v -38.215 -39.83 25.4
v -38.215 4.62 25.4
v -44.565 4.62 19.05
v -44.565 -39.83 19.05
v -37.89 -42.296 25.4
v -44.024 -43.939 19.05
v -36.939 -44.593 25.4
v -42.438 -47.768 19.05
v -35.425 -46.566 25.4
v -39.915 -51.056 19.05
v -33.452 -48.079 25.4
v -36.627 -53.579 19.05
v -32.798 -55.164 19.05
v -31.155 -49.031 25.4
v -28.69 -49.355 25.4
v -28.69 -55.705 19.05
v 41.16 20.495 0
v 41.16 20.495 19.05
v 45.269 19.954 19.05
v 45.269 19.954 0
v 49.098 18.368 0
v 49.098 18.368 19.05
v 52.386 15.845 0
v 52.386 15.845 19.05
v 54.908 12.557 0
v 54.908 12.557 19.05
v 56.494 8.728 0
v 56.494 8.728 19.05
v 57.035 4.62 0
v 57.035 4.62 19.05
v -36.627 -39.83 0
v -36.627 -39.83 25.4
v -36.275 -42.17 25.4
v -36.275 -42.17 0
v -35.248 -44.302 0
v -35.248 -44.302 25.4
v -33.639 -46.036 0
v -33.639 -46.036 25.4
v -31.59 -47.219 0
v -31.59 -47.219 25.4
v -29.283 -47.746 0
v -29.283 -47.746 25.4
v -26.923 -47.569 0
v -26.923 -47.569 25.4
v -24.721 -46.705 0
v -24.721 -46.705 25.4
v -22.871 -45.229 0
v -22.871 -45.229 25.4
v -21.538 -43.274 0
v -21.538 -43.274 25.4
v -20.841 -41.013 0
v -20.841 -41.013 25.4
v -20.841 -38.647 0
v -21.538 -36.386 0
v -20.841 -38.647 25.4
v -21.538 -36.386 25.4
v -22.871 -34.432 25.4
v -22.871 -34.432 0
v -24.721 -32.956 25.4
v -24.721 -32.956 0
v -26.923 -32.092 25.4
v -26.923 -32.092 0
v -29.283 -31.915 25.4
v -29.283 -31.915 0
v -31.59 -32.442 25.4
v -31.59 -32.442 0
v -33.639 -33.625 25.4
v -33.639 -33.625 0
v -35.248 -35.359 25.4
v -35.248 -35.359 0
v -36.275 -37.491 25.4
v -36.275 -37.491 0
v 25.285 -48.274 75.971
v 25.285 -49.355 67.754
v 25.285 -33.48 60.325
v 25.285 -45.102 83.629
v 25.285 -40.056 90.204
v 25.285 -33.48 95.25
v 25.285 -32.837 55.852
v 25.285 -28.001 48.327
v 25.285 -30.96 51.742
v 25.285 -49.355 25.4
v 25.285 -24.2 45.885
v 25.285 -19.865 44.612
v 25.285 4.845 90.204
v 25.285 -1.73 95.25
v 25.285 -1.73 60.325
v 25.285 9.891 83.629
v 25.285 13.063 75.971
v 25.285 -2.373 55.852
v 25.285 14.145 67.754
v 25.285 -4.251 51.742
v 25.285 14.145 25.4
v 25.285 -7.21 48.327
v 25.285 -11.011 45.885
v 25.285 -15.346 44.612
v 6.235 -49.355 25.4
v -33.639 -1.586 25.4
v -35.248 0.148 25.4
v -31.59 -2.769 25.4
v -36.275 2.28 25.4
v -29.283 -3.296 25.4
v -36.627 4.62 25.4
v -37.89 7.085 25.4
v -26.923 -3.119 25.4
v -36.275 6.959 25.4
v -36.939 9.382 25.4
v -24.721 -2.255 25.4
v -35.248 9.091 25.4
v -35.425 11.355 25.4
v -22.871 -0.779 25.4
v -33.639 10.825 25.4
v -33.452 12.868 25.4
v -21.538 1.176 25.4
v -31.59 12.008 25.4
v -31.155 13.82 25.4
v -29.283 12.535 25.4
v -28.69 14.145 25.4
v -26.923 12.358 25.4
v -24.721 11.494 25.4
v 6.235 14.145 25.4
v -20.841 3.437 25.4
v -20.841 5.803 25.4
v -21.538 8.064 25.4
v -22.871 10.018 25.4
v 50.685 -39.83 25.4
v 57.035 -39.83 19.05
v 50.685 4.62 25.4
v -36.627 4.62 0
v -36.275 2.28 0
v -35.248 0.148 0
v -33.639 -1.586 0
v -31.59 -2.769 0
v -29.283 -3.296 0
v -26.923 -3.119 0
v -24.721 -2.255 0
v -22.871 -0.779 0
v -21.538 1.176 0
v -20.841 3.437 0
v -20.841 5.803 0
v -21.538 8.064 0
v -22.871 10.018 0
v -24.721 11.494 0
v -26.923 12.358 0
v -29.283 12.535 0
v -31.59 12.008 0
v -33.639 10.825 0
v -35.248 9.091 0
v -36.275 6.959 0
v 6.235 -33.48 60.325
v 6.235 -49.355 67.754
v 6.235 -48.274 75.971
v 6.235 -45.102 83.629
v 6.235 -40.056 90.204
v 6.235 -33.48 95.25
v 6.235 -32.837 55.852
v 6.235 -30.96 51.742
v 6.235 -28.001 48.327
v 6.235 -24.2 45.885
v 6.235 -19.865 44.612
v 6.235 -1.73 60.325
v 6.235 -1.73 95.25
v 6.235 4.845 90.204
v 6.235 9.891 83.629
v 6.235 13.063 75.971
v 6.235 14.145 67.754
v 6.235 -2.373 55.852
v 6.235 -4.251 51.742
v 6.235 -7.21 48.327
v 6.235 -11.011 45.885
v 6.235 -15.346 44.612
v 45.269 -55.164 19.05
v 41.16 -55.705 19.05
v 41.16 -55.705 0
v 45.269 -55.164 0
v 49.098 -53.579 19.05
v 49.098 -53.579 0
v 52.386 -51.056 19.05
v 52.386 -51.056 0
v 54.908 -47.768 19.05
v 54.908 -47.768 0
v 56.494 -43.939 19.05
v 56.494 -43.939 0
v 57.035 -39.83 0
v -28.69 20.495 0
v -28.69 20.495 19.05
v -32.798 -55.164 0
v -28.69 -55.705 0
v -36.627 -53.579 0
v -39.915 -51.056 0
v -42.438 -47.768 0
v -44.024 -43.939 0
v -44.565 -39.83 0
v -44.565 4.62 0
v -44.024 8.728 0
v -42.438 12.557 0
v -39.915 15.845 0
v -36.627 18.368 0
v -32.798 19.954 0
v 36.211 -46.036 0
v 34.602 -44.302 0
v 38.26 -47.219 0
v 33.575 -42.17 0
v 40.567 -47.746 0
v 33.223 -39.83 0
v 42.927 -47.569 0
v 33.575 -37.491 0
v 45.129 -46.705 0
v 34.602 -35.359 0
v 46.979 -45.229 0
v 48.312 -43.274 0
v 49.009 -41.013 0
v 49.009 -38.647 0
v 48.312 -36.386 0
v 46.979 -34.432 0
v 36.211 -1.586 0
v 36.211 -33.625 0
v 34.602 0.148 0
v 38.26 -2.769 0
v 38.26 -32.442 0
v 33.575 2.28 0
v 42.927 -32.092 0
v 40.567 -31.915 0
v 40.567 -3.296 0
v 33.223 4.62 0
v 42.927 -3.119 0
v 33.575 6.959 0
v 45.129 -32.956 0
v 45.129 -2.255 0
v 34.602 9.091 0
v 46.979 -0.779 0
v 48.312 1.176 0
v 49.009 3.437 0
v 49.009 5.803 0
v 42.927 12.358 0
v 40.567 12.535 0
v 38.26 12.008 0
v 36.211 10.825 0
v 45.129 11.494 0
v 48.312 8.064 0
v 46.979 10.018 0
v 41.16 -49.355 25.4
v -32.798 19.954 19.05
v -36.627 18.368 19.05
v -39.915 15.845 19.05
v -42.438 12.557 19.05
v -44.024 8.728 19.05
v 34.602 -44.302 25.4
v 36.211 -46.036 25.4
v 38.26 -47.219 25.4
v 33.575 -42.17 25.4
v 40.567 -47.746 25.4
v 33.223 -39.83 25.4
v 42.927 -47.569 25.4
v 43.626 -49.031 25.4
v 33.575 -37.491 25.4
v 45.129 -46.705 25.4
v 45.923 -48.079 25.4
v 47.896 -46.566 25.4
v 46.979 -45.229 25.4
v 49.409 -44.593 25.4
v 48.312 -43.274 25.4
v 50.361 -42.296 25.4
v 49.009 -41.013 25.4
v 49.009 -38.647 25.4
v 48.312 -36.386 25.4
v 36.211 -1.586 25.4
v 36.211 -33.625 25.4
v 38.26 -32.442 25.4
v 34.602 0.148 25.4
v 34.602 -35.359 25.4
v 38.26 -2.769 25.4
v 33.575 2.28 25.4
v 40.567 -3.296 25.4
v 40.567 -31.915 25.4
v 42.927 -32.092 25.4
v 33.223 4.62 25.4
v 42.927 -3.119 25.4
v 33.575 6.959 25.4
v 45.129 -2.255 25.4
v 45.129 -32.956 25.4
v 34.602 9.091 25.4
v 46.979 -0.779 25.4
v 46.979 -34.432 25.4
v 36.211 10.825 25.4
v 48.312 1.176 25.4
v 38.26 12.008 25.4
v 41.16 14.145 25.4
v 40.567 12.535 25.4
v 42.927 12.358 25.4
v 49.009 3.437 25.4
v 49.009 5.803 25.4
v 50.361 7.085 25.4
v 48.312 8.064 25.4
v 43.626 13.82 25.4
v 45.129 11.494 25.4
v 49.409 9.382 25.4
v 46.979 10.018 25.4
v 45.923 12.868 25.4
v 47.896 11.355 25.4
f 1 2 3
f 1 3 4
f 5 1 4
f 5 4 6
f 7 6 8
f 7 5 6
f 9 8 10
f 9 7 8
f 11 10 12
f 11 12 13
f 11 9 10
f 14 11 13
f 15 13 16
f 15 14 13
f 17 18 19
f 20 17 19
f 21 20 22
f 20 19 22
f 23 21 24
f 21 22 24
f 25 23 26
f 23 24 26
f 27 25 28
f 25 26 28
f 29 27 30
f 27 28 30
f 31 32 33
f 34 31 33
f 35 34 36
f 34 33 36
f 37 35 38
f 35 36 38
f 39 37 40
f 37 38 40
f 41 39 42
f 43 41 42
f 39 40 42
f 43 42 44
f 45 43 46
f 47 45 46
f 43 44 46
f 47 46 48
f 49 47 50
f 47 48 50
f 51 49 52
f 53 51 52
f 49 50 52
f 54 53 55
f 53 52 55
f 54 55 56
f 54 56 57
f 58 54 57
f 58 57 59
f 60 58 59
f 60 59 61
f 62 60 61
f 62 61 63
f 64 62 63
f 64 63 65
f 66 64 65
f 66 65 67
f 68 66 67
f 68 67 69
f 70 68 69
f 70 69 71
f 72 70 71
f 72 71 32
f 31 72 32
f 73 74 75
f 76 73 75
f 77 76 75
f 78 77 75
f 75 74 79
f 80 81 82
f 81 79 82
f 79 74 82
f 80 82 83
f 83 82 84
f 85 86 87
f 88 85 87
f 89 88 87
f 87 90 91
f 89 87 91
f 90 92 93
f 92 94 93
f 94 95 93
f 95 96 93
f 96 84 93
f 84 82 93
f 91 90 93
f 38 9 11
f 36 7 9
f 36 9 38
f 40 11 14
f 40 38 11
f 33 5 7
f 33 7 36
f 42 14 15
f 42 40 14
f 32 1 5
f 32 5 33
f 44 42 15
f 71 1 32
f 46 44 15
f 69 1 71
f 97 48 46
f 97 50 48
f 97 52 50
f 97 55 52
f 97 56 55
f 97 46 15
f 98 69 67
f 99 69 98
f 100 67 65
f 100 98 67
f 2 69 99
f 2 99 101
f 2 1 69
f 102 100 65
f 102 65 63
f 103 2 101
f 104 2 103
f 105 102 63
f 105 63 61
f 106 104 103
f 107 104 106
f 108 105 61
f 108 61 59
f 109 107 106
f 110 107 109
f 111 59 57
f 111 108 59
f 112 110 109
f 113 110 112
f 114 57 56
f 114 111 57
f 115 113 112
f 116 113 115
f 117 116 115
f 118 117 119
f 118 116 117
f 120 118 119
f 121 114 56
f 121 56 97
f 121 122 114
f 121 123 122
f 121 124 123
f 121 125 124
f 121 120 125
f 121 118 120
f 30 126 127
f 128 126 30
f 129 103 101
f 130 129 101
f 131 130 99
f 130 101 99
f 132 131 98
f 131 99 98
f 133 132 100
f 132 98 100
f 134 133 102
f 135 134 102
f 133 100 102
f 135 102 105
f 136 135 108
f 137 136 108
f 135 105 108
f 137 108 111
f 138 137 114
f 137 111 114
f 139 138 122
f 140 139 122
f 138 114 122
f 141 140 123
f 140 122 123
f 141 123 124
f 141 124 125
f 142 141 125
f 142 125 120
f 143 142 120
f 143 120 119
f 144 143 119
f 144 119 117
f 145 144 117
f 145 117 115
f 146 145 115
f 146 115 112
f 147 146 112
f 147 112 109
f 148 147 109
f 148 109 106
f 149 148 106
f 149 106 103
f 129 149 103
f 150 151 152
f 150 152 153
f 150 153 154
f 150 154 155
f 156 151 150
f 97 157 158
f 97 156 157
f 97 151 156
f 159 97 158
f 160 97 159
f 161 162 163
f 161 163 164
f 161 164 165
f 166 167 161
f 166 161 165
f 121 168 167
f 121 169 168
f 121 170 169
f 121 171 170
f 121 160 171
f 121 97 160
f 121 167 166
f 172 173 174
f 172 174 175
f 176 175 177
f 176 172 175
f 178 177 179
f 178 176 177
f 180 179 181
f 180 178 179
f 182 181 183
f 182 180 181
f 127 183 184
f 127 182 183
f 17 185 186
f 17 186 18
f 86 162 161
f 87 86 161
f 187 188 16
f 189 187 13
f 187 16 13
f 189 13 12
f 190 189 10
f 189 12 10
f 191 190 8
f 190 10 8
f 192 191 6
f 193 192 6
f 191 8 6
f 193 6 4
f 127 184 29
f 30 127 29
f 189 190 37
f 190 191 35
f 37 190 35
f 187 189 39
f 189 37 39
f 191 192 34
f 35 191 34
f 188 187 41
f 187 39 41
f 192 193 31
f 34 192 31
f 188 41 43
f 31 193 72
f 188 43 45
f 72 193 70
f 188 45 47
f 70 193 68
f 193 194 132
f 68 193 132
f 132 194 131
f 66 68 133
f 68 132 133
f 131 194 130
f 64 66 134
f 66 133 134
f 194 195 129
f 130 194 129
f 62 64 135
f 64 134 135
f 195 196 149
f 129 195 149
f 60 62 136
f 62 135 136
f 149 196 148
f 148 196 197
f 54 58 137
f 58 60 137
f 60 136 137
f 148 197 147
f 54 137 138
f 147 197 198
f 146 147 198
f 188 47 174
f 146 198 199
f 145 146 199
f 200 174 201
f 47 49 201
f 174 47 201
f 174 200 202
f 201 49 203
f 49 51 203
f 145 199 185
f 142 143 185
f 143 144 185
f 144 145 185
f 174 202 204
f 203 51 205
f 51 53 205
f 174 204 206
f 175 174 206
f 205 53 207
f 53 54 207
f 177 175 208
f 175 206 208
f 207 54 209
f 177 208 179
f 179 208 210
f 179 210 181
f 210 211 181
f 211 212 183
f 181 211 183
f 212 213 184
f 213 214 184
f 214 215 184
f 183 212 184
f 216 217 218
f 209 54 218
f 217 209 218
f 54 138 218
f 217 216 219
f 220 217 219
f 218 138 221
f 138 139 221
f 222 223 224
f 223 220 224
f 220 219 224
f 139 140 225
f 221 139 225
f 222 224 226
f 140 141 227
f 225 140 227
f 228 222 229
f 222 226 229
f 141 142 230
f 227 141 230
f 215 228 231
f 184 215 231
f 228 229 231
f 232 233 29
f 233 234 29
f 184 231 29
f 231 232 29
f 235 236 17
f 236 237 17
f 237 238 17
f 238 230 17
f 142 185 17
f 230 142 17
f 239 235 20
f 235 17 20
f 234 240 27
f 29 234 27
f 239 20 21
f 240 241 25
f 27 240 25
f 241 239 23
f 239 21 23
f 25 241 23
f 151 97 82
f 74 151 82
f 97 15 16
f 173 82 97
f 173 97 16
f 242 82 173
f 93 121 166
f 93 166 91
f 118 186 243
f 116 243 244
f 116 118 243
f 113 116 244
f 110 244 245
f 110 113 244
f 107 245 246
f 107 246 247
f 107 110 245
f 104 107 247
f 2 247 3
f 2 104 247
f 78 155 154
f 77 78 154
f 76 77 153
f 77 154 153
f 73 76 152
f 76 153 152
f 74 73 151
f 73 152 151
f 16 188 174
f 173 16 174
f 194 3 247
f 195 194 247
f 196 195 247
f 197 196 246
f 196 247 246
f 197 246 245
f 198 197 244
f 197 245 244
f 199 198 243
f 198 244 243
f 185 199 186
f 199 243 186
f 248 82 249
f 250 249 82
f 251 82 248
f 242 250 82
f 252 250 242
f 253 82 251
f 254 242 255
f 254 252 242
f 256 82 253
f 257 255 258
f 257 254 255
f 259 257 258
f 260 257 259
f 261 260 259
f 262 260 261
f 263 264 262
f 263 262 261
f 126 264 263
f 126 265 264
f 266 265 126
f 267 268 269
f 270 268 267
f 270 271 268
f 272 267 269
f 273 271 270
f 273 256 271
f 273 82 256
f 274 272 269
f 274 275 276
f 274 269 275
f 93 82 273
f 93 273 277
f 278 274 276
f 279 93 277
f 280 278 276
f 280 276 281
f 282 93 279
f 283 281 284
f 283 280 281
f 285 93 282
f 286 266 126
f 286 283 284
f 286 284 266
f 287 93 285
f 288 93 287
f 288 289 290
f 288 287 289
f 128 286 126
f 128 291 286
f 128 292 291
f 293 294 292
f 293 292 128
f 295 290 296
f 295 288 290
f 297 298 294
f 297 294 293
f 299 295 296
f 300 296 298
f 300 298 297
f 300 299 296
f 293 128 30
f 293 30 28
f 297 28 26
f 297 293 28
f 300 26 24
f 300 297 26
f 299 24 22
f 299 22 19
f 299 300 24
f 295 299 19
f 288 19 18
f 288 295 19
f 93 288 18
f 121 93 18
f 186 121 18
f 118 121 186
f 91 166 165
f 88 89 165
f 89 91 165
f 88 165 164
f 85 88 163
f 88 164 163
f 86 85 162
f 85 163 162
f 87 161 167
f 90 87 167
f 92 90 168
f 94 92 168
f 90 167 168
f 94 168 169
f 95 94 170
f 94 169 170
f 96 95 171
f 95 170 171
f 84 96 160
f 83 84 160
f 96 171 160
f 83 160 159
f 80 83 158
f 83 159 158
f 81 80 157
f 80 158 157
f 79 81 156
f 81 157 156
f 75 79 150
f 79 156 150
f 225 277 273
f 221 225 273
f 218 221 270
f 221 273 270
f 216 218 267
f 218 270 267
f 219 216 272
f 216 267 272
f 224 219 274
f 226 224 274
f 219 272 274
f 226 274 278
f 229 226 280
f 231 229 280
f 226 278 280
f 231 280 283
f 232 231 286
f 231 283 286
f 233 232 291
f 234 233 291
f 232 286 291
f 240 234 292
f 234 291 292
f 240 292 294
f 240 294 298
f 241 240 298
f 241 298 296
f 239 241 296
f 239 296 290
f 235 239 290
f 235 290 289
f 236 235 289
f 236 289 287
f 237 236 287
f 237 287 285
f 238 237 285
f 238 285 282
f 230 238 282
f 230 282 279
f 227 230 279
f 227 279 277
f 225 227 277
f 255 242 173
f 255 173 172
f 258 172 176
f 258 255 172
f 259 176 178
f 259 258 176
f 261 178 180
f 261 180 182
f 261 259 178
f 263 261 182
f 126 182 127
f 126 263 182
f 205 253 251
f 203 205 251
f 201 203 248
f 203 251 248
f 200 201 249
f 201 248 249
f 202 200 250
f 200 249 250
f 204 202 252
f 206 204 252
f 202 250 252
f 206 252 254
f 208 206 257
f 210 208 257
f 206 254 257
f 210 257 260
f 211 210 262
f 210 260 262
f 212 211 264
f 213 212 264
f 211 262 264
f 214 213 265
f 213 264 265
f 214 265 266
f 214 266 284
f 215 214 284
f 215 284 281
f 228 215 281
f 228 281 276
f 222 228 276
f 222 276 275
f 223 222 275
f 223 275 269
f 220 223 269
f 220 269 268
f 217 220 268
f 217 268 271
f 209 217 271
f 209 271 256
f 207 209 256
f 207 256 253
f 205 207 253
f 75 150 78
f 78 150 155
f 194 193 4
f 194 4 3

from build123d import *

# Parameters (mm, degrees)
F0_W         = 101.6
F0_H         = 76.2
F1_DEPTH     = 25.4
F2_R         = 15.875
F3_R         = 15.875
F4_R         = 15.875
F5_R         = 15.875
F7_D         = 15.875
F8_SIZE      = 6.35
F9_W         = 19.05
F9_H         = 63.5
F10_DEPTH    = 69.85
F12_DEPTH    = 25.4
F13_T1_DEPTH = 156.5315328508
F14_T1_DEPTH = 156.5315328508


# Not quite as in the source:
# - a fillet or chamfer that OpenCascade refuses, or shapes differently, is made with other operations: its cross-section is extruded or revolved along the edge and cut away or added


with BuildPart() as f1:
    # F0 (on Top) → F1 (new body)
    with BuildSketch(Plane.XY):
        with Locations((6.2353381336, -17.6054243982)):
            Rectangle(F0_W, F0_H)
    extrude(amount=F1_DEPTH)

    # F2
    f2_edges = [f1.edges().sort_by_distance(p)[0] for p in [
        (57.035338, -55.705424, 12.7),
    ]]
    fillet(f2_edges, radius=F2_R)

    # F3
    f3_edges = [f1.edges().sort_by_distance(p)[0] for p in [
        (-44.564662, -55.705424, 12.7),
    ]]
    fillet(f3_edges, radius=F3_R)

    # F4
    f4_edges = [f1.edges().sort_by_distance(p)[0] for p in [
        (-44.564662, 20.494576, 12.7),
    ]]
    fillet(f4_edges, radius=F4_R)

    # F5
    f5_edges = [f1.edges().sort_by_distance(p)[0] for p in [
        (57.035338, 20.494576, 12.7),
    ]]
    fillet(f5_edges, radius=F5_R)

    # F7 (through all)
    with Locations(Plane(origin=(0, 0, 0), x_dir=(1, 0, 0), z_dir=(0, 0, -1))):
        with Locations((-28.6896618664, 39.8304243982), (41.1603381336, 39.8304243982), (41.1603381336, -4.6195756018), (-28.6896618664, -4.6195756018)):
            Hole(F7_D / 2)

    # F8
    f8_edges = [f1.edges().sort_by_distance(p)[0] for p in [
        (6.235338, -55.705424, 25.4),
        (6.235338, 20.494576, 25.4),
        (52.385658, 15.844896, 25.4),
        (-39.914982, 15.844896, 25.4),
        (57.035338, -17.605424, 25.4),
        (-44.564662, -17.605424, 25.4),
        (52.385658, -51.055745, 25.4),
        (-39.914982, -51.055745, 25.4),
    ]]
    chamfer(f8_edges, length=F8_SIZE)

    # F9 (on face) → F10 (join)
    with BuildSketch(Plane.XY.offset(25.4)):
        with Locations((15.7603381336, -17.6054243982)):
            Rectangle(F9_W, F9_H)
    extrude(amount=F10_DEPTH)

    # F11 (on face) → F12 (cut)
    with BuildSketch(Plane(origin=(6.2353381336, 0, 0), x_dir=(0, -1, 0), z_dir=(-1, 0, 0))):
        with BuildLine():
            ThreePointArc((1.7304243982, 60.325), (17.6054243982, 44.45), (33.4804243982, 60.325))
            ThreePointArc((33.4804243982, 60.325), (17.6054243982, 76.2), (1.7304243982, 60.325))
        make_face()
        with BuildLine():
            ThreePointArc((1.7304243982, 60.325), (17.6054243982, 76.2), (33.4804243982, 60.325))
            Line((33.4804243982, 60.325), (33.4804243982, 95.25))
            Line((33.4804243982, 95.25), (1.7304243982, 95.25))
            Line((1.7304243982, 95.25), (1.7304243982, 60.325))
        make_face()
    extrude(amount=-F12_DEPTH, mode=Mode.SUBTRACT)

    # F13: fillet of radius 31.75 on 1 edges, made by hand

    # F13_s2 → F13_t1 (cut)
    with BuildSketch(Plane.YZ.offset(-62.5054282918)):
        with BuildLine():
            ThreePointArc((-33.4804243982, 95.25), (-45.1017309683, 83.6286934298), (-49.3554243982, 67.7536934298))
            Line((-49.3554243982, 67.7536934298), (-49.3554243982, 95.25))
            Line((-49.3554243982, 95.25), (-33.4804243982, 95.25))
        make_face()
    extrude(amount=F13_T1_DEPTH, mode=Mode.SUBTRACT)

    # F14: fillet of radius 31.75 on 1 edges, made by hand

    # F14_s2 → F14_t1 (cut)
    with BuildSketch(Plane.YZ.offset(-62.5054282918)):
        with BuildLine():
            ThreePointArc((14.1445756018, 67.7536934298), (9.890882172, 83.6286934298), (-1.7304243982, 95.25))
            Line((-1.7304243982, 95.25), (14.1445756018, 95.25))
            Line((14.1445756018, 95.25), (14.1445756018, 67.7536934298))
        make_face()
    extrude(amount=F14_T1_DEPTH, mode=Mode.SUBTRACT)


solid = f1.part
